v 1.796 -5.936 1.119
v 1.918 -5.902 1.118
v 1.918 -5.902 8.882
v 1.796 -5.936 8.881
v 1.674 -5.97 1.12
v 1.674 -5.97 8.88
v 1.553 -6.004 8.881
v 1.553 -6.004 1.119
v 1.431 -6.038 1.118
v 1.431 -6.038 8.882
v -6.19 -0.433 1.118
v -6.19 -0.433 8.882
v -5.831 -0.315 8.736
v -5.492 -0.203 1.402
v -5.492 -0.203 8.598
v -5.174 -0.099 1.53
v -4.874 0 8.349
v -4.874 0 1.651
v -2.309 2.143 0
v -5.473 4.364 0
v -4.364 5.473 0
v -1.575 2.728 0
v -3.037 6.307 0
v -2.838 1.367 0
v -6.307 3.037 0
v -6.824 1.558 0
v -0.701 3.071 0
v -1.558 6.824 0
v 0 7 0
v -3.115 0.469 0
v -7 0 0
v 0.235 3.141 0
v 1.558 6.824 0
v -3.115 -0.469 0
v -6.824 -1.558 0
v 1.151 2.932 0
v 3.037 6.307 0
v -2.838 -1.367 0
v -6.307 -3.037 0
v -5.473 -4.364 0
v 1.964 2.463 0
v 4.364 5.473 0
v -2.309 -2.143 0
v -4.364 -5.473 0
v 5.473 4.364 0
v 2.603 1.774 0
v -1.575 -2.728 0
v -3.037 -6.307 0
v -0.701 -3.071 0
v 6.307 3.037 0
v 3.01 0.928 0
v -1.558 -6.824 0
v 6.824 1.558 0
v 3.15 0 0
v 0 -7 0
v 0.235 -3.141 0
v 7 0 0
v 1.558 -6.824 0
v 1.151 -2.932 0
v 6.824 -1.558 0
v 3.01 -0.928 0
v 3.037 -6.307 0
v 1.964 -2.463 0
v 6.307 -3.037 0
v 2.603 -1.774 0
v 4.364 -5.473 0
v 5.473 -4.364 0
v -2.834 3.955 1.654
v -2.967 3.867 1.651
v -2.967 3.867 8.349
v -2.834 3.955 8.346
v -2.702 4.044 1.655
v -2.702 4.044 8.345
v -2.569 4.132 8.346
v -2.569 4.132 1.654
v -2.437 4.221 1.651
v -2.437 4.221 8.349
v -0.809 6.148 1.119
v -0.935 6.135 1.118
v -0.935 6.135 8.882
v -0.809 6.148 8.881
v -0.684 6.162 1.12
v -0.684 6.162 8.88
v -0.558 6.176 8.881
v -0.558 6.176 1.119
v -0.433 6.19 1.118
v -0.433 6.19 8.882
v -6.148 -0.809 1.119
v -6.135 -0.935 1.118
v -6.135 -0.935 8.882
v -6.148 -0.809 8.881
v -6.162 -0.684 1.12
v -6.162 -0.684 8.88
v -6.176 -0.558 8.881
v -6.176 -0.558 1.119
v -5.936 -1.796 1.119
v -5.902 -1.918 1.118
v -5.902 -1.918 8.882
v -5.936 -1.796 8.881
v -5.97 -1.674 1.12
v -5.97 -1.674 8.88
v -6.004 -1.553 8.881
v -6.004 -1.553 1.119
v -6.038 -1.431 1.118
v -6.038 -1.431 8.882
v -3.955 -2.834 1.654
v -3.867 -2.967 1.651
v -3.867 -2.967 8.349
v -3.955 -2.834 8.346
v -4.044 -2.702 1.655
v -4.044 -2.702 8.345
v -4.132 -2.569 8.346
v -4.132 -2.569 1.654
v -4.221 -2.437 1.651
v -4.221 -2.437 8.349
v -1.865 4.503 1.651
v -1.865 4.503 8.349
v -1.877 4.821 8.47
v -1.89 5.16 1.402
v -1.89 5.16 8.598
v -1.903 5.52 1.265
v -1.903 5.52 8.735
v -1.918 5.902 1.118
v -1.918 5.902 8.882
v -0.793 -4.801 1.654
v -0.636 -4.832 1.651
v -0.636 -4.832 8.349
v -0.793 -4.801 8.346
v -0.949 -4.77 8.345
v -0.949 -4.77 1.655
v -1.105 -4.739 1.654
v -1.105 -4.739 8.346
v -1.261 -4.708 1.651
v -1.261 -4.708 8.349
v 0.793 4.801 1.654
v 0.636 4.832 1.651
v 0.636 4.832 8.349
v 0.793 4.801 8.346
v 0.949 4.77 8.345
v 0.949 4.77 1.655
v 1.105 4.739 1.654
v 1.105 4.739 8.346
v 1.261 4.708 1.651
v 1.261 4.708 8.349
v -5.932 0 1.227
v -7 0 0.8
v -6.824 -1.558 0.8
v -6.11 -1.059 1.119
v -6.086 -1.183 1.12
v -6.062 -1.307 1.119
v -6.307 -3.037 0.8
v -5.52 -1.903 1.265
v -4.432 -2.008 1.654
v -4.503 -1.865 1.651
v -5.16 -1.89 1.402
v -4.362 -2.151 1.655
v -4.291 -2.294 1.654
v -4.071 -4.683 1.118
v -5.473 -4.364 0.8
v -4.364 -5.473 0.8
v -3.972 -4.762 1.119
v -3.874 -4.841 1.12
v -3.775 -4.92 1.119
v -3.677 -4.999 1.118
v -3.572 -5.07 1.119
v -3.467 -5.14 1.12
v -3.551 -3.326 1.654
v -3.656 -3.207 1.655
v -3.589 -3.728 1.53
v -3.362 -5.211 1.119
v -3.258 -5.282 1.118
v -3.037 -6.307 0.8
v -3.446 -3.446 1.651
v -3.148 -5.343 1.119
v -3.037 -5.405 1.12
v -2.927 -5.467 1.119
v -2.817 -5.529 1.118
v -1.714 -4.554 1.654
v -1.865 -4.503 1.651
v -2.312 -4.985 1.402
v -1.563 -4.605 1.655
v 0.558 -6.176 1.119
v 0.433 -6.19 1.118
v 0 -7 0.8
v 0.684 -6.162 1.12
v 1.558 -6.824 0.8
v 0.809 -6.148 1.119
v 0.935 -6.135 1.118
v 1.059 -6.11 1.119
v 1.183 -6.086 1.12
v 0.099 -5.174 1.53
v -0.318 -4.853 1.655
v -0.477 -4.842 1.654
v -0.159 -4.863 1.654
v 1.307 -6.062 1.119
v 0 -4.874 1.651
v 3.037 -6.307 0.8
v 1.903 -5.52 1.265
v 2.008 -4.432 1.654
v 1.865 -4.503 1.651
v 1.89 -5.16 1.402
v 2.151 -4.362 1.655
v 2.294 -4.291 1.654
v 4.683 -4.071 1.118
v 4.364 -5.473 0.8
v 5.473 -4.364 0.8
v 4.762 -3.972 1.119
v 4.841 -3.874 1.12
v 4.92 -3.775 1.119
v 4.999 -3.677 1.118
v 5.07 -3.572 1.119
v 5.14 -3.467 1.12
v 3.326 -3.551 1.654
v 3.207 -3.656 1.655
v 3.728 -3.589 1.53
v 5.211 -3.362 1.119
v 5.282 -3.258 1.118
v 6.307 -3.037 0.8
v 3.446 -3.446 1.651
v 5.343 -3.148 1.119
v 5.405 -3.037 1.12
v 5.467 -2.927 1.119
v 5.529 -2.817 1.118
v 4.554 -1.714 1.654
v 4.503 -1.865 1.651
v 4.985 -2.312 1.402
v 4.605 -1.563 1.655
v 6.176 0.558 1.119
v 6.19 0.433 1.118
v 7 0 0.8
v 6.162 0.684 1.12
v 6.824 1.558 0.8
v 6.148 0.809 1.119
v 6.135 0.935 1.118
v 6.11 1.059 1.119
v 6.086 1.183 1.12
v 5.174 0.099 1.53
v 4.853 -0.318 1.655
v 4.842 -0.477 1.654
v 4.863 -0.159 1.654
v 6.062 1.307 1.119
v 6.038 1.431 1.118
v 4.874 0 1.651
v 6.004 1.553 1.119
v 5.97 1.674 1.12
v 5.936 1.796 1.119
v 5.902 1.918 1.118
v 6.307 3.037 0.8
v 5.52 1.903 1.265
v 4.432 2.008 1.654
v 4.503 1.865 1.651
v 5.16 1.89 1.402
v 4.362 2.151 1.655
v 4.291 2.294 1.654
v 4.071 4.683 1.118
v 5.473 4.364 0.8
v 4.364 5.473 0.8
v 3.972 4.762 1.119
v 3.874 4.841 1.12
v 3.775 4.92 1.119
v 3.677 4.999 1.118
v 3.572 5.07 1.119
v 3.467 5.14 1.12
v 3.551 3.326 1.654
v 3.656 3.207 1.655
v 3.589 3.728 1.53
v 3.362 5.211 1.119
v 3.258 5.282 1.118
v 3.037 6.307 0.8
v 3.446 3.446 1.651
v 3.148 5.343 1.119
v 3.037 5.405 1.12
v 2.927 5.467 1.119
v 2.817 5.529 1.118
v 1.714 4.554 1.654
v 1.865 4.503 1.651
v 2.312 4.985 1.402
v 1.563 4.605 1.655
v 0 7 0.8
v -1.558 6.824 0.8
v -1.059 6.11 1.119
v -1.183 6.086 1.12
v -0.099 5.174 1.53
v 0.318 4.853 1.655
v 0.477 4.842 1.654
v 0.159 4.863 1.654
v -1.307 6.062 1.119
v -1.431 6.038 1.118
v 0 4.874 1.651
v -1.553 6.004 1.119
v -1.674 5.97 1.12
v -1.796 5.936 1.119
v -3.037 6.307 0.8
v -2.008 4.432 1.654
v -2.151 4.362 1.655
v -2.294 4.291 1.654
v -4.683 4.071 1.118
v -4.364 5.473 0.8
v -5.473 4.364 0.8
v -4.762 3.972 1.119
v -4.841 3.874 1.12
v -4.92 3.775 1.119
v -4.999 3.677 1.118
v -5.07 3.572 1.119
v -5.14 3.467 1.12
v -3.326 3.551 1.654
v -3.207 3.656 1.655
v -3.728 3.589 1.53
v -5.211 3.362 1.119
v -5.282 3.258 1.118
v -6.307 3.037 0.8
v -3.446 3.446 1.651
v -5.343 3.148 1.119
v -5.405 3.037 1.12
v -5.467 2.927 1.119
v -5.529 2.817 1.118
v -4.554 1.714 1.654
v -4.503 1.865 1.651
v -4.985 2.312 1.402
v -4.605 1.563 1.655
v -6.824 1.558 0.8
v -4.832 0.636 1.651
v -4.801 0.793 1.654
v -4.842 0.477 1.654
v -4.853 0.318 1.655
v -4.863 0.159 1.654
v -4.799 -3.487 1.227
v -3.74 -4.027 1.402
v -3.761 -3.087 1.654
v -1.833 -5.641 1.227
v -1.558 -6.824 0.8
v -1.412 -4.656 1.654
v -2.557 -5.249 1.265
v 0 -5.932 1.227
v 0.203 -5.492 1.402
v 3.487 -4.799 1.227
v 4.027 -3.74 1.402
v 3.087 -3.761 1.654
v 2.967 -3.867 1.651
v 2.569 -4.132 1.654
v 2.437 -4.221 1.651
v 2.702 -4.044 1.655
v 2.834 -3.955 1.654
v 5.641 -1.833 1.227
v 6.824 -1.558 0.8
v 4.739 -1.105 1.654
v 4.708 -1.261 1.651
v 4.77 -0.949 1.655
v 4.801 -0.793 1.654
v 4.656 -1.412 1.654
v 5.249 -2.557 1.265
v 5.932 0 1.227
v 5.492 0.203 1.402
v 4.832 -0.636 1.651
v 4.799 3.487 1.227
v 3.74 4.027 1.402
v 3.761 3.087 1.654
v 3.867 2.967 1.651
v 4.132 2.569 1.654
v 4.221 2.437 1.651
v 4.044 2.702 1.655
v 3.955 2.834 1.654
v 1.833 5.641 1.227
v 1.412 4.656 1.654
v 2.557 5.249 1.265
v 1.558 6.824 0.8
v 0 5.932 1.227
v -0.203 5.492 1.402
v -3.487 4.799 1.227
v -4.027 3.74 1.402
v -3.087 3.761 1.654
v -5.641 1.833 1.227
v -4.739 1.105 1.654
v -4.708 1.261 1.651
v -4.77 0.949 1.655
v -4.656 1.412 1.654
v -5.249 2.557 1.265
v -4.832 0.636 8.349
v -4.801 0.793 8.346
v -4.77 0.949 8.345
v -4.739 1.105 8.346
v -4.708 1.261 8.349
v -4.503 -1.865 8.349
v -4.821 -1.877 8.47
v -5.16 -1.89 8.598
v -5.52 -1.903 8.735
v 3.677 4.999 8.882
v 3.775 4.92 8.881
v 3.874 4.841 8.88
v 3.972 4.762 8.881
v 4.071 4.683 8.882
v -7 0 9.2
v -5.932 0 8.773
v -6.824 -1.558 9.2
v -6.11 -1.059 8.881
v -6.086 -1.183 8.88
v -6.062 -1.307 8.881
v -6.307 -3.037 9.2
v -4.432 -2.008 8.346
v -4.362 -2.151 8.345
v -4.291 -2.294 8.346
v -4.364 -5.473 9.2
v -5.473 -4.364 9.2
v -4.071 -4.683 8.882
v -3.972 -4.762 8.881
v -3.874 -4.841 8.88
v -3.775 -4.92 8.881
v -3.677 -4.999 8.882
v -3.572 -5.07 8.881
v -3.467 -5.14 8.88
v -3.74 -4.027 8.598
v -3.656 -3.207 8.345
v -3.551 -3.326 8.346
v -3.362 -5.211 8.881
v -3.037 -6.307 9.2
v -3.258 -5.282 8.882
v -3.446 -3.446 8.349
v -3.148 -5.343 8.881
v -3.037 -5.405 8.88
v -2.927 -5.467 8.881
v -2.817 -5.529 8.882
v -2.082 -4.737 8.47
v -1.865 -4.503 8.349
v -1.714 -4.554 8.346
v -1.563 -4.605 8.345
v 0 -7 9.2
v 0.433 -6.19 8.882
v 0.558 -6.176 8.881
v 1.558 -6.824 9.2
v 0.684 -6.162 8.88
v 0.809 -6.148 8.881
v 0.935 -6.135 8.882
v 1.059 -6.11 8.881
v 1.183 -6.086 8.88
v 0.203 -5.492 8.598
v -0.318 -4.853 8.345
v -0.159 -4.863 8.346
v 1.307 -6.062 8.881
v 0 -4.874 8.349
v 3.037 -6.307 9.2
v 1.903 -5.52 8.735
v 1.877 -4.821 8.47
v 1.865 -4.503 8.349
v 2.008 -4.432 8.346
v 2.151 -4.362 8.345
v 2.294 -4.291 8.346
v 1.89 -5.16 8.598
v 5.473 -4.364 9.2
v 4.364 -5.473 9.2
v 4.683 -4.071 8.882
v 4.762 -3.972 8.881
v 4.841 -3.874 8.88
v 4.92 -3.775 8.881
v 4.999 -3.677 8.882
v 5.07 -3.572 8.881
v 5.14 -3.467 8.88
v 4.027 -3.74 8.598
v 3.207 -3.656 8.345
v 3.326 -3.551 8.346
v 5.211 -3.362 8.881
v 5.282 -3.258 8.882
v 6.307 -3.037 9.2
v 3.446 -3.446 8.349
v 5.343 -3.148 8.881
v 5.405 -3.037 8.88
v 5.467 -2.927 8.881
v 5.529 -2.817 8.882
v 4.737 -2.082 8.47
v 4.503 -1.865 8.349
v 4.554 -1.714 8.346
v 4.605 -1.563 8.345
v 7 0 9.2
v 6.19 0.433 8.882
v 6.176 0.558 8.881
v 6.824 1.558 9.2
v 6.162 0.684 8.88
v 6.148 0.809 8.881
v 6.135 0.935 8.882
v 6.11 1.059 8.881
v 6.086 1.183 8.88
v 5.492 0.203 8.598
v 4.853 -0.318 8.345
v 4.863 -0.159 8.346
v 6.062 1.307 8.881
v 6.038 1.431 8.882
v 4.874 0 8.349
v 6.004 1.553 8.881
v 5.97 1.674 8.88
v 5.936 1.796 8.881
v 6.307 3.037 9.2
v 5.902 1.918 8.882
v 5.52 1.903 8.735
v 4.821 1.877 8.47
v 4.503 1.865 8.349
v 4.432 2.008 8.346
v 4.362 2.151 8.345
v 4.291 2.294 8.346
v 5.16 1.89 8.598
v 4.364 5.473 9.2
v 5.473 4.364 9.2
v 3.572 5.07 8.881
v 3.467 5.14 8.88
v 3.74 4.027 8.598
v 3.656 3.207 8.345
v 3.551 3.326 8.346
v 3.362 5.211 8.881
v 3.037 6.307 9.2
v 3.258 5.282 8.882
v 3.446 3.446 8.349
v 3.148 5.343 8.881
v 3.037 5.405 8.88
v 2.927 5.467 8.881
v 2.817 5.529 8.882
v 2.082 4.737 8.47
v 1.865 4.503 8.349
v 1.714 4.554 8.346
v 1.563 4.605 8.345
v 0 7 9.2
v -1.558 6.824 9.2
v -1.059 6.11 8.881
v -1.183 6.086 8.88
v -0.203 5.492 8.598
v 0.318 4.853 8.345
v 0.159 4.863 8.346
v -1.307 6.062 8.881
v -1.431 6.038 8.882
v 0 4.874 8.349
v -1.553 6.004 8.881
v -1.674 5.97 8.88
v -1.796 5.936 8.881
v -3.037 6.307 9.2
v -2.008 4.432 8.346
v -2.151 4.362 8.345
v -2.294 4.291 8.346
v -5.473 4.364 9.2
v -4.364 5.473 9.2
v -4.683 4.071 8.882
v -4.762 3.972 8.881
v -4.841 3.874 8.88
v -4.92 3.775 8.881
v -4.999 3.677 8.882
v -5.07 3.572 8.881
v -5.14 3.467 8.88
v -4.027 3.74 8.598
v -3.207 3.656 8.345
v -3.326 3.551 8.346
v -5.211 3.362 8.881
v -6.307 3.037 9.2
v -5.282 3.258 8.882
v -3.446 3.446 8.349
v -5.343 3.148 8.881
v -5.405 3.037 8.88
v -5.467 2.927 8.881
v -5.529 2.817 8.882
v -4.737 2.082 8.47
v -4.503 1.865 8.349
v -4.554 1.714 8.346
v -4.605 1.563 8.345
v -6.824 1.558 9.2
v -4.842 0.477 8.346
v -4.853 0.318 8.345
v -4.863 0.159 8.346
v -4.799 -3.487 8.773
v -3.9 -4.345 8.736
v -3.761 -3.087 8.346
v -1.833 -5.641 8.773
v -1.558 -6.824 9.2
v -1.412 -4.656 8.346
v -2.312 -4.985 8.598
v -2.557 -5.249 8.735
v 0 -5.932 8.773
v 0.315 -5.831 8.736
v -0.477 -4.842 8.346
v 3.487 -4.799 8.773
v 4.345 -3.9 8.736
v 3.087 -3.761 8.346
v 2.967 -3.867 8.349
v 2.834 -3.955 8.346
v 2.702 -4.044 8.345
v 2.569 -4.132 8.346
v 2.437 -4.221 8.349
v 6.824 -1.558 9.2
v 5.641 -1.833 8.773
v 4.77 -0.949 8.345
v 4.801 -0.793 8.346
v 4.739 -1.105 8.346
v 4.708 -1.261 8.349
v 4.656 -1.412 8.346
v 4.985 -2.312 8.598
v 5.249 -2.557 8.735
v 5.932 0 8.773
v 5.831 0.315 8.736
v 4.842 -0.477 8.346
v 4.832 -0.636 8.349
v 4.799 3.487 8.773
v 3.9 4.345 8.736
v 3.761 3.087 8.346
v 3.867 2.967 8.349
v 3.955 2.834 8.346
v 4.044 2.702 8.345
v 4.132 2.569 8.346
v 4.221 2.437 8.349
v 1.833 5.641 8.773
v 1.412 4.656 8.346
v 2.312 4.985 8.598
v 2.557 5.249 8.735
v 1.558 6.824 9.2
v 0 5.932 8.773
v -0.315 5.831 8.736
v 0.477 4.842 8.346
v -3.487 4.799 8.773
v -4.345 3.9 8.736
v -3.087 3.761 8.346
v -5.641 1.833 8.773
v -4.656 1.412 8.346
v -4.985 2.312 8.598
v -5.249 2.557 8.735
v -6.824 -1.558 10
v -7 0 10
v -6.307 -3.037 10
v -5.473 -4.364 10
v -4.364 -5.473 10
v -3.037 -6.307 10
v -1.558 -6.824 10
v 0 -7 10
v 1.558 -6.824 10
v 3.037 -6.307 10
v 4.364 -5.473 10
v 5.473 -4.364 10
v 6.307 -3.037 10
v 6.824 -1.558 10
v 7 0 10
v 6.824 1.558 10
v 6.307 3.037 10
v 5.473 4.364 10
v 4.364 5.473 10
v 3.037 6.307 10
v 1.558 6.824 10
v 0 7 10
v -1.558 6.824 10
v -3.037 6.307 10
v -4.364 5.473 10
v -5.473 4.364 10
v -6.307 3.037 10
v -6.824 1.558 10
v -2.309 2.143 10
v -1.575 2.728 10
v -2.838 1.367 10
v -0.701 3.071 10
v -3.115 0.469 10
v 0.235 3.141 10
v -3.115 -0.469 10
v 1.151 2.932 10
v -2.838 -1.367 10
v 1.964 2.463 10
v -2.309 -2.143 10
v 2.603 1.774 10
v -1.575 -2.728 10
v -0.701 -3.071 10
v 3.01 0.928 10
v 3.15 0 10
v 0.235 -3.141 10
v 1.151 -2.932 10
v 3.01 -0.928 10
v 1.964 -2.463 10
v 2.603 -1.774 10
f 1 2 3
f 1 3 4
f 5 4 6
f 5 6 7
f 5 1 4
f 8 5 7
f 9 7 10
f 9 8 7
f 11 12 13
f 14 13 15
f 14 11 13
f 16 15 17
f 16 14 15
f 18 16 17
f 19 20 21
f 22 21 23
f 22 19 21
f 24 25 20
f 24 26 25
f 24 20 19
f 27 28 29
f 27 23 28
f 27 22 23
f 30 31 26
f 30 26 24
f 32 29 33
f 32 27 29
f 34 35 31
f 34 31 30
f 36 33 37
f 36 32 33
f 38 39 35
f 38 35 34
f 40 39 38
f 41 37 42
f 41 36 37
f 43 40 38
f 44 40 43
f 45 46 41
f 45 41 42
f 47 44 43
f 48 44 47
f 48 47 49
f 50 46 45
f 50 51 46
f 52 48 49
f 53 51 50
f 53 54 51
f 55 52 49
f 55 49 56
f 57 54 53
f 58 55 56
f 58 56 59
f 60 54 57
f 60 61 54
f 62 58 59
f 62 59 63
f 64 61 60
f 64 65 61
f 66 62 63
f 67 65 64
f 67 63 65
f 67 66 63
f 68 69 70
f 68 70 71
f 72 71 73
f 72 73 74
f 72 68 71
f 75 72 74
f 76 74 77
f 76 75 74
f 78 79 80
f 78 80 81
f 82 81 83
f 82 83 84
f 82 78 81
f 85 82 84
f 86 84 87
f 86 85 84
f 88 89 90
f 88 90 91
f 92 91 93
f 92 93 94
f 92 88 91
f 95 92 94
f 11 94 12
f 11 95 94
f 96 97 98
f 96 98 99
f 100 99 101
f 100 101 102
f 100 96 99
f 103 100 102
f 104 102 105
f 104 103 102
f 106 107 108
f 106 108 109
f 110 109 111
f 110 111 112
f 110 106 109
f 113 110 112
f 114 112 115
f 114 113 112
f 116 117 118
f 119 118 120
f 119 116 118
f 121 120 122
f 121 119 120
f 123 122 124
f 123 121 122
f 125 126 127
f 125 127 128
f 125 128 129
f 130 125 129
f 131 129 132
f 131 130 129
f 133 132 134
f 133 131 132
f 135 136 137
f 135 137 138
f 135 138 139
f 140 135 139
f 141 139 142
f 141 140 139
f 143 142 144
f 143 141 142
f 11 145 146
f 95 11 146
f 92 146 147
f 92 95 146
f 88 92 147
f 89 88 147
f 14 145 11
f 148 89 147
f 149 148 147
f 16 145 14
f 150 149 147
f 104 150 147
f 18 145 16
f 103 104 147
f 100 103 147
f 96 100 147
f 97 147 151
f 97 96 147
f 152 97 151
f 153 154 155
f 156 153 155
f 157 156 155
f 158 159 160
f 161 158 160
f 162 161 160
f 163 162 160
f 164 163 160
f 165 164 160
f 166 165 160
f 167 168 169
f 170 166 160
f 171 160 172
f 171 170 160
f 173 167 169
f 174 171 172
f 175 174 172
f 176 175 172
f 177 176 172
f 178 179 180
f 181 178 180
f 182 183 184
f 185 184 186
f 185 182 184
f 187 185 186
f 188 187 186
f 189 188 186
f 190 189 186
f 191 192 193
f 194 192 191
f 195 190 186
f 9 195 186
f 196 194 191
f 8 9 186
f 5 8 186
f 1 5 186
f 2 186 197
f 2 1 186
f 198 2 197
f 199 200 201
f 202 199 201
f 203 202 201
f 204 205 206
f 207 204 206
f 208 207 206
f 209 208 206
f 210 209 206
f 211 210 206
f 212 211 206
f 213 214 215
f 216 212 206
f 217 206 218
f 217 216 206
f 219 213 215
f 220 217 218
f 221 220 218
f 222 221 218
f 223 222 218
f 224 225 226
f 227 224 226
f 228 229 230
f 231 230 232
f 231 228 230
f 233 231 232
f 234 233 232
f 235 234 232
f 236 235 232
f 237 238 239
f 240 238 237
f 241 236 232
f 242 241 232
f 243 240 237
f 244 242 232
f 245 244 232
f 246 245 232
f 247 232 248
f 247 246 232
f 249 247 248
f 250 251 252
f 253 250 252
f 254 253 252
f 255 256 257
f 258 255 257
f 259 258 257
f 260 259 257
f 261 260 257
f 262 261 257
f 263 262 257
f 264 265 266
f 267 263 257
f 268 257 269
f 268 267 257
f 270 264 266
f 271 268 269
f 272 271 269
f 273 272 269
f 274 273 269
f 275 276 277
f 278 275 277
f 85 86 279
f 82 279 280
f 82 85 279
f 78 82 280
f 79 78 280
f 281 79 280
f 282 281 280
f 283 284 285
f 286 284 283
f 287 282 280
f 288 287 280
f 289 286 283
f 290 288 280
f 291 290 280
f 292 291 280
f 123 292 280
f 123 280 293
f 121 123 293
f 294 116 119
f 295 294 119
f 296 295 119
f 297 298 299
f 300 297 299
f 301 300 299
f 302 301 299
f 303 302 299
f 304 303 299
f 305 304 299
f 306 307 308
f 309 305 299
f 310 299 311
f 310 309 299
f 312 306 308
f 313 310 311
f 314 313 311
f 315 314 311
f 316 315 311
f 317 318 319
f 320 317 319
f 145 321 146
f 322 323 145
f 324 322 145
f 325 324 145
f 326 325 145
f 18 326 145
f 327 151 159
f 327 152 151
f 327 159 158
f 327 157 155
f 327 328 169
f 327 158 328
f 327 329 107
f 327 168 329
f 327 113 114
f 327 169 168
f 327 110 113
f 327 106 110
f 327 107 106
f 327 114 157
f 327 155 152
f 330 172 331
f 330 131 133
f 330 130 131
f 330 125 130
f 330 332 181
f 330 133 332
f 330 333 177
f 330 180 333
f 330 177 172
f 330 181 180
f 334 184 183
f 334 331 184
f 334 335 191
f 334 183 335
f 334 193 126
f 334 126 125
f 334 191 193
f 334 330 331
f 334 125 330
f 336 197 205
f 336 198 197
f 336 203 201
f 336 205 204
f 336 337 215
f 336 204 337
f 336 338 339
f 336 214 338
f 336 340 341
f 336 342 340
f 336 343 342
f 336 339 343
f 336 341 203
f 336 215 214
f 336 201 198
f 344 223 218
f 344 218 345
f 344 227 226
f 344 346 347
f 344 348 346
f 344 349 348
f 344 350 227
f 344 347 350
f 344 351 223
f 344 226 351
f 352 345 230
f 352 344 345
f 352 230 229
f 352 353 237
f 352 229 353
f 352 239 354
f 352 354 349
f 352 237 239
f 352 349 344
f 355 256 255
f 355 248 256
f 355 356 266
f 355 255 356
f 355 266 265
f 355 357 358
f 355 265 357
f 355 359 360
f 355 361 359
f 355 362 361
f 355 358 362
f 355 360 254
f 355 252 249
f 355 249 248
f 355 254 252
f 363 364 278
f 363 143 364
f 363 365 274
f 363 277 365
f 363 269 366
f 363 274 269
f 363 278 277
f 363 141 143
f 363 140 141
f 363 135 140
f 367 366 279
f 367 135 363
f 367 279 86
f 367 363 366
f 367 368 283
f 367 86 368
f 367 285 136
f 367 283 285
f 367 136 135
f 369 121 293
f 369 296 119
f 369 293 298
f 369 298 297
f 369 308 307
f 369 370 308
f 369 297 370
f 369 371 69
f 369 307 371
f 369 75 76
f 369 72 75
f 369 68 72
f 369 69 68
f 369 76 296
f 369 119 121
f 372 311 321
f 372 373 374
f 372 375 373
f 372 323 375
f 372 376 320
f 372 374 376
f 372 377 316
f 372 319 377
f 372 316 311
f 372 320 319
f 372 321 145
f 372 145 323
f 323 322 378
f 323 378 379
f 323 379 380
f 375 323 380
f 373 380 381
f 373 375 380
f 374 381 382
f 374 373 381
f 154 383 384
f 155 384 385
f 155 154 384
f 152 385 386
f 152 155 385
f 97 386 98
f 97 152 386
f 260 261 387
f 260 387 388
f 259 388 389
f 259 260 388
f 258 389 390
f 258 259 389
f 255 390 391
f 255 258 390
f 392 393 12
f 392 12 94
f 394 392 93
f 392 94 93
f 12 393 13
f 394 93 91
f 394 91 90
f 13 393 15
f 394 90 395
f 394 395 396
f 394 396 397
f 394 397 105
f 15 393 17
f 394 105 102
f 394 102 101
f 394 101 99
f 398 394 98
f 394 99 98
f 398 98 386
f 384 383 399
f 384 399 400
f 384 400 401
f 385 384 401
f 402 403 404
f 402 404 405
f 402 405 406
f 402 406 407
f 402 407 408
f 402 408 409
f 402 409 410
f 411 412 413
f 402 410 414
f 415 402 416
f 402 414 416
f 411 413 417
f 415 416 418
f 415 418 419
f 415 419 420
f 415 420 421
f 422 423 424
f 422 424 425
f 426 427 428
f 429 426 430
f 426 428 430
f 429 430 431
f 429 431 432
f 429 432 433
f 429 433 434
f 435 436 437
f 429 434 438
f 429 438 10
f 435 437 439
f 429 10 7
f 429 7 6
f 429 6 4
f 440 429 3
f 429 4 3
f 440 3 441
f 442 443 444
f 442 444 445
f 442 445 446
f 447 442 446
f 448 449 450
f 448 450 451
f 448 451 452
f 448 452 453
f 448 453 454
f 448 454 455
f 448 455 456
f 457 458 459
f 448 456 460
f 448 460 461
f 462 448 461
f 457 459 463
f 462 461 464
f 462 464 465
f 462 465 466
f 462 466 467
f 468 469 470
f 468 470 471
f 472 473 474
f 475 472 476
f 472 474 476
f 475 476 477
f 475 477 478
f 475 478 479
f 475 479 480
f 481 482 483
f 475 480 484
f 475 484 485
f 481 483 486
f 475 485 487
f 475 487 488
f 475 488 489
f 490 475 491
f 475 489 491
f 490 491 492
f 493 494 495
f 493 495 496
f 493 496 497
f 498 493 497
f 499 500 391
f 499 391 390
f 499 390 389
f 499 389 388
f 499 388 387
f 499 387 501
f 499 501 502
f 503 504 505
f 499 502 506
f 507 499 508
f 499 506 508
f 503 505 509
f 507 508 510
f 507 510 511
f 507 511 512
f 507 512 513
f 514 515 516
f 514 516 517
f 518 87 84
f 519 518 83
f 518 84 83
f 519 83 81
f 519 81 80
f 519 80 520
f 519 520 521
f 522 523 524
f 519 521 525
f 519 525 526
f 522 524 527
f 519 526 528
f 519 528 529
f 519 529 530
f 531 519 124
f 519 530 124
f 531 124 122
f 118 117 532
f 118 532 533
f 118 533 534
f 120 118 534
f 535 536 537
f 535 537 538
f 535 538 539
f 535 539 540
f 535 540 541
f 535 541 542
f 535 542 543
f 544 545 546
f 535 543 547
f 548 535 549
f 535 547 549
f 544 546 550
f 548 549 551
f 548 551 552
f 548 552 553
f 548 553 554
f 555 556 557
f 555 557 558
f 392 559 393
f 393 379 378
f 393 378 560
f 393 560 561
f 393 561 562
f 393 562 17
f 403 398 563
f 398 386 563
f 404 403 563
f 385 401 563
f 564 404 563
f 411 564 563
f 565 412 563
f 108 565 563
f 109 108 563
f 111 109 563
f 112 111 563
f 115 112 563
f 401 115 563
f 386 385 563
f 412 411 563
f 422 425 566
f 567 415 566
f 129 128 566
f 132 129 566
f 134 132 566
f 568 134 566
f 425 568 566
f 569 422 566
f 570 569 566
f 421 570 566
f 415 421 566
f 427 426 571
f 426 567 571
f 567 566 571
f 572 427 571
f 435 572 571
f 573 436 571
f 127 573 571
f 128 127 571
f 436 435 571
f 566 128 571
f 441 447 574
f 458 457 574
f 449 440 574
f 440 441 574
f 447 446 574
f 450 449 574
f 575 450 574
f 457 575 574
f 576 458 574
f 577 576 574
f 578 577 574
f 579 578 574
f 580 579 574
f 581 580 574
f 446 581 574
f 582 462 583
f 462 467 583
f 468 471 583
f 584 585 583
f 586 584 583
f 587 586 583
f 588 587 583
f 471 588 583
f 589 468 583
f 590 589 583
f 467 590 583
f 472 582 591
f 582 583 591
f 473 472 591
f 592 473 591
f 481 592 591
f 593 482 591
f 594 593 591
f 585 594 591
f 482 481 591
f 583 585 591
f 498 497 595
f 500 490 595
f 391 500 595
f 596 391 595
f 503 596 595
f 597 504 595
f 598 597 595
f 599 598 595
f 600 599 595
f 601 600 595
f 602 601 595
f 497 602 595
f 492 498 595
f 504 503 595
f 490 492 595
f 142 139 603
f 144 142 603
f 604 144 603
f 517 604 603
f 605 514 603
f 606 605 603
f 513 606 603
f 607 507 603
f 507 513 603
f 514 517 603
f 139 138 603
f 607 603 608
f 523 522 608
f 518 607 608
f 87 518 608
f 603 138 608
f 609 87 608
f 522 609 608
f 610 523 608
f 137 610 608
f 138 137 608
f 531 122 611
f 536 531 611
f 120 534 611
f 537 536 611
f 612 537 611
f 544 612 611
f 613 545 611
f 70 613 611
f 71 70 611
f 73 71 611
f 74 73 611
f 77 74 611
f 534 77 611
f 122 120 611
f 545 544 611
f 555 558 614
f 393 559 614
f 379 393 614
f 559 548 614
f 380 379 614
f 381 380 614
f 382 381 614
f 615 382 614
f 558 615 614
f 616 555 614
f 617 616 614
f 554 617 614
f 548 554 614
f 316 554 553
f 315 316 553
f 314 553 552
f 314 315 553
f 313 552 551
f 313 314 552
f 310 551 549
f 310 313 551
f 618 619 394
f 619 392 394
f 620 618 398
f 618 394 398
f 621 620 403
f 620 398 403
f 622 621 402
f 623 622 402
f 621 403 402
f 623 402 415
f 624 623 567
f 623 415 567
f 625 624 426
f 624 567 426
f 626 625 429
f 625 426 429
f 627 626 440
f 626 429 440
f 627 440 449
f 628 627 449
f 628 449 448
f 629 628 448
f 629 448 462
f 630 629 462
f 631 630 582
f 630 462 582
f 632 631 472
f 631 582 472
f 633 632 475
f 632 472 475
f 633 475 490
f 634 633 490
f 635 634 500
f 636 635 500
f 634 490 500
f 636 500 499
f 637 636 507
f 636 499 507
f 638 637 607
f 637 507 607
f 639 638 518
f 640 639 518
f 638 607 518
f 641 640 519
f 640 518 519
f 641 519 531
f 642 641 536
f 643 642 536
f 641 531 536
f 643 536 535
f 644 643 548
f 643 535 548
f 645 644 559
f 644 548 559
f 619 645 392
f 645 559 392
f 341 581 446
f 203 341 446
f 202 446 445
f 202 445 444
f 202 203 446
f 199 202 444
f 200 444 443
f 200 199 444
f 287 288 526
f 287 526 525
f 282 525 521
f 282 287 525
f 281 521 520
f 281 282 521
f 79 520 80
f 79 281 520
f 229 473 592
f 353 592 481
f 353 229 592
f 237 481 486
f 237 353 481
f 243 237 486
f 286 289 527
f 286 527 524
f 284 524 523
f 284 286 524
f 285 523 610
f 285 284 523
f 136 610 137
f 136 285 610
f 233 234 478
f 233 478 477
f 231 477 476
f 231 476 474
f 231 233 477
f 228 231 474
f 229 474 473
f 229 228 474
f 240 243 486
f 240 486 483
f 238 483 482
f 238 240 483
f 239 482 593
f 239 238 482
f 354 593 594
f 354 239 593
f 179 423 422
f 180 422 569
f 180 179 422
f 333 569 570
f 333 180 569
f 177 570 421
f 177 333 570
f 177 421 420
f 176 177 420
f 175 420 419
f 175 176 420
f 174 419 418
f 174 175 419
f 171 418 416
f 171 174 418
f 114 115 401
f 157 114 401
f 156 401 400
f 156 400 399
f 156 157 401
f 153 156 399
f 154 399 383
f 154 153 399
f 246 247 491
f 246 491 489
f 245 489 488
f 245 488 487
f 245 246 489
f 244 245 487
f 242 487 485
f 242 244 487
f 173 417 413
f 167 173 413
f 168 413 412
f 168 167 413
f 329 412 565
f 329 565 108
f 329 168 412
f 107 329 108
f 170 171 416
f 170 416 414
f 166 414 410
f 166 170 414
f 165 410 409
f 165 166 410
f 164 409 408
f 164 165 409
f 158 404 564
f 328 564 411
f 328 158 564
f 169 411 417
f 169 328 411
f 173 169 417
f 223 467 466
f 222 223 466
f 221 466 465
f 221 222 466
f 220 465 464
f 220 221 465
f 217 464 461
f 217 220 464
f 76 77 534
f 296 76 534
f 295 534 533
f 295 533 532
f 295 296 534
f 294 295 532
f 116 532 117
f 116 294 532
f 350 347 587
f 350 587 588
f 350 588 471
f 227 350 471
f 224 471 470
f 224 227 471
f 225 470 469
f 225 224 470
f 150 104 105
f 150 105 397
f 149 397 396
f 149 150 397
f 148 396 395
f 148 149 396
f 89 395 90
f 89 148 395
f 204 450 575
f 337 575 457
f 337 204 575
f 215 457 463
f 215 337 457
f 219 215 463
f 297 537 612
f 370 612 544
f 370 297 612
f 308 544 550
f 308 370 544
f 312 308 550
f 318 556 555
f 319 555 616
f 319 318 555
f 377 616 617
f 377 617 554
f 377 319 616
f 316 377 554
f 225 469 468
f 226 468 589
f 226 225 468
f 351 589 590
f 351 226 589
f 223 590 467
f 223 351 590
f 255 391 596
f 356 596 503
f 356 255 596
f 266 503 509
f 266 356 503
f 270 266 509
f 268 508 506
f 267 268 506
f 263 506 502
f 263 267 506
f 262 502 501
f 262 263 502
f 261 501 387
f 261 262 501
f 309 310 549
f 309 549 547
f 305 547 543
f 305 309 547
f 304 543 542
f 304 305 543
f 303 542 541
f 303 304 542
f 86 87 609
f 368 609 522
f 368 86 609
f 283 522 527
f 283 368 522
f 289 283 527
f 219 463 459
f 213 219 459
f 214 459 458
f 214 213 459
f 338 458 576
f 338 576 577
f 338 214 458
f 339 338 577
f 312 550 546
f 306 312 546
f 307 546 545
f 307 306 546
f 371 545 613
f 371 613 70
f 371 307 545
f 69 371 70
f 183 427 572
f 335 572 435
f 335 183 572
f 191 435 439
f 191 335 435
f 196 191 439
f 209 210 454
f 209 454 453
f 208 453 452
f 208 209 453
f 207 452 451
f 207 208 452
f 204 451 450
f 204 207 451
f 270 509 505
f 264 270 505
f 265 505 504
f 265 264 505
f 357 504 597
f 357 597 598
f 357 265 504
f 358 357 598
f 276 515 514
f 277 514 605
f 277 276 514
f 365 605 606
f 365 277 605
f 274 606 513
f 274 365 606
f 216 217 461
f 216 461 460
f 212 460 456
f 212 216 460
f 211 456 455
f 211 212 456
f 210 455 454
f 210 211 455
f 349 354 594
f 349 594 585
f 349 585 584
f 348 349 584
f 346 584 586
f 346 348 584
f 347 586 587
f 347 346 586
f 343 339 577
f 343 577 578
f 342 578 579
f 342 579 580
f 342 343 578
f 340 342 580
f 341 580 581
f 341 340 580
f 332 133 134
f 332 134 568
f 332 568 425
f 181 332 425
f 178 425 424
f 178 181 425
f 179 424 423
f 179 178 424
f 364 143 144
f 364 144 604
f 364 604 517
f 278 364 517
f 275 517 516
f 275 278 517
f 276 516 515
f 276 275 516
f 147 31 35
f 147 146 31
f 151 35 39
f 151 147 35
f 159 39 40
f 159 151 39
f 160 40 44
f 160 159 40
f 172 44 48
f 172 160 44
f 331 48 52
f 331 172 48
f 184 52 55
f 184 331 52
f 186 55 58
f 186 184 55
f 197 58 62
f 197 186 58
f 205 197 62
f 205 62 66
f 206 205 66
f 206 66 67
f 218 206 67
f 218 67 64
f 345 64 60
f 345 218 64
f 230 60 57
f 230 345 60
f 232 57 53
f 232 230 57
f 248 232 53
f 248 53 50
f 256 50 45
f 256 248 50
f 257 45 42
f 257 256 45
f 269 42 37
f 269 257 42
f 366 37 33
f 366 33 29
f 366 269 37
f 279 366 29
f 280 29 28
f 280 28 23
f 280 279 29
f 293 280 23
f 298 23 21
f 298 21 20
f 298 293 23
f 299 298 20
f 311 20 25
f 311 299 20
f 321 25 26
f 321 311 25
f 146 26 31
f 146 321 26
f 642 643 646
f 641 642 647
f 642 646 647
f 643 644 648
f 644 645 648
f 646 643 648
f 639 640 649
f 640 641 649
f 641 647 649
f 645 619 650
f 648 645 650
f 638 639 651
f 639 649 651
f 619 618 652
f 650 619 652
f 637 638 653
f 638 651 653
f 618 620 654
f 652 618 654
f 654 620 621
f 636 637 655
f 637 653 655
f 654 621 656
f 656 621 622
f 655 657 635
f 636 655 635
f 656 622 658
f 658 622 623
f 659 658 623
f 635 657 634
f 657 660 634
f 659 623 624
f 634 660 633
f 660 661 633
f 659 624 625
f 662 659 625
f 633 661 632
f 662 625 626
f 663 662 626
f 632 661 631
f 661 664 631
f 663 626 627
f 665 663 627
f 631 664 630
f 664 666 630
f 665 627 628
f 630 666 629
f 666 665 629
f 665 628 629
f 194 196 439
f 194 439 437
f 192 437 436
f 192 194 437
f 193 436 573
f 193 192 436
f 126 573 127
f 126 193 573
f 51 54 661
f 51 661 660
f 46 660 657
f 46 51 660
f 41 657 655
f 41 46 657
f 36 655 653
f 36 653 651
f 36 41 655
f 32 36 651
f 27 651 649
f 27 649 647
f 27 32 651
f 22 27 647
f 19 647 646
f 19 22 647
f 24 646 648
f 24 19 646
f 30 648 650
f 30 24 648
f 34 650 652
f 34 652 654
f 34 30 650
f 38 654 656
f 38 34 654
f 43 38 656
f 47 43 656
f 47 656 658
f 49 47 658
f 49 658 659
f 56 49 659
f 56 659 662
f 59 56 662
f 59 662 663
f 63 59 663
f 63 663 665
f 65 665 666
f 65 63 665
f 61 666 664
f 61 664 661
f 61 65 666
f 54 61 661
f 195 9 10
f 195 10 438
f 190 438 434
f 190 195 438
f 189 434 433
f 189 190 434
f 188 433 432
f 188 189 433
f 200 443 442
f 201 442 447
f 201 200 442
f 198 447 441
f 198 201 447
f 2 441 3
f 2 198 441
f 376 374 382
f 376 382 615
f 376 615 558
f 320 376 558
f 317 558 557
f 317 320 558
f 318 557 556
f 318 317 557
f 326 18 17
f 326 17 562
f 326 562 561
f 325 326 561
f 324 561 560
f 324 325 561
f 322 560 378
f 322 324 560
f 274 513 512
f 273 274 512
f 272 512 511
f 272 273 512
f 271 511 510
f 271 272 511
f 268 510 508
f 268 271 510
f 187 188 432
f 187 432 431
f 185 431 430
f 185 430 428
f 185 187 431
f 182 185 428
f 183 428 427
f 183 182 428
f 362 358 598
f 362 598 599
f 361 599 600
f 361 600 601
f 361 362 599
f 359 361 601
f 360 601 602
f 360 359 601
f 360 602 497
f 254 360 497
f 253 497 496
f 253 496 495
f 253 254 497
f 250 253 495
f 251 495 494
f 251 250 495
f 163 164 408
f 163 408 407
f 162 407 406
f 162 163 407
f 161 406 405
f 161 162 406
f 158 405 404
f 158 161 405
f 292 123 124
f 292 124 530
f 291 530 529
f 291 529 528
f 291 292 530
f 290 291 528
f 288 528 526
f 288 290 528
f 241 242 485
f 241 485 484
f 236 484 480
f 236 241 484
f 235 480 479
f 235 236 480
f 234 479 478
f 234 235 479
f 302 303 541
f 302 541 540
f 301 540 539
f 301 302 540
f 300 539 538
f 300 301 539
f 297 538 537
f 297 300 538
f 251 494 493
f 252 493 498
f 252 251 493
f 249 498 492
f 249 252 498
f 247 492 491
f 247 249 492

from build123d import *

# Parameters (mm, degrees)
SKETCH2_R           = 3.15
BOSS_EXTRUDE1_DEPTH = 10


with BuildPart() as part:
    # Sketch2 → Boss-Extrude1 (new body)
    with BuildSketch(Plane.XY):
        Polygon((4.873707771, 0), (4.832012177, -0.636146486), (4.707640171, -1.261407971), (4.502718925, -1.865087032), (5.52904892, -2.817190886), (5.281517029, -3.257688046), (4.998967171, -3.676585913), (4.683272839, -4.071106911), (3.44623208, -3.44623208), (2.966924906, -3.866571903), (2.436853886, -4.2207551), (1.865087032, -4.502718925), (1.917572975, -5.901682854), (1.431063056, -6.038129807), (0.935064673, -6.134541988), (0.432866603, -6.190280914), (0, -4.873707771), (-0.636146486, -4.832012177), (-1.261407971, -4.707640171), (-1.865087032, -4.502718925), (-2.817190886, -5.52904892), (-3.257688046, -5.281517029), (-3.676585913, -4.998967171), (-4.071106911, -4.683272839), (-3.44623208, -3.44623208), (-3.866571903, -2.966924906), (-4.2207551, -2.436853886), (-4.502718925, -1.865087032), (-5.901682854, -1.917572975), (-6.038129807, -1.431063056), (-6.134541988, -0.935064673), (-6.190280914, -0.432866603), (-4.873707771, 0), (-4.832012177, 0.636146486), (-4.707640171, 1.261407971), (-4.502718925, 1.865087032), (-5.52904892, 2.817190886), (-5.281517029, 3.257688046), (-4.998967171, 3.676585913), (-4.683272839, 4.071106911), (-3.44623208, 3.44623208), (-2.966924906, 3.866571903), (-2.436853886, 4.2207551), (-1.865087032, 4.502718925), (-1.917572975, 5.901682854), (-1.431063056, 6.038129807), (-0.935064673, 6.134541988), (-0.432866603, 6.190280914), (0, 4.873707771), (0.636146486, 4.832012177), (1.261407971, 4.707640171), (1.865087032, 4.502718925), (2.817190886, 5.52904892), (3.257688046, 5.281517029), (3.676585913, 4.998967171), (4.071106911, 4.683272839), (3.44623208, 3.44623208), (3.866571903, 2.966924906), (4.2207551, 2.436853886), (4.502718925, 1.865087032), (5.901682854, 1.917572975), (6.038129807, 1.431063056), (6.134541988, 0.935064673), (6.190280914, 0.432866603), align=None)
        Circle(SKETCH2_R, mode=Mode.SUBTRACT)
    extrude(amount=BOSS_EXTRUDE1_DEPTH)

    # Sketch3 → Revolve1 (revolve)
    with BuildSketch(Plane(origin=(0, 0, 0), x_dir=(1, 0, 0), z_dir=(0, 1, 0))):
        Polygon((-4, 0), (-7, 0), (-7, -0.8), (-4, -2), align=None)
    revolve1 = revolve(axis=Axis((0, 0, 0), (0, 0, 1)))

    # Mirror1: Revolve1 across plane
    add(revolve1.mirror(Plane.XY.offset(5)))


solid = part.part
